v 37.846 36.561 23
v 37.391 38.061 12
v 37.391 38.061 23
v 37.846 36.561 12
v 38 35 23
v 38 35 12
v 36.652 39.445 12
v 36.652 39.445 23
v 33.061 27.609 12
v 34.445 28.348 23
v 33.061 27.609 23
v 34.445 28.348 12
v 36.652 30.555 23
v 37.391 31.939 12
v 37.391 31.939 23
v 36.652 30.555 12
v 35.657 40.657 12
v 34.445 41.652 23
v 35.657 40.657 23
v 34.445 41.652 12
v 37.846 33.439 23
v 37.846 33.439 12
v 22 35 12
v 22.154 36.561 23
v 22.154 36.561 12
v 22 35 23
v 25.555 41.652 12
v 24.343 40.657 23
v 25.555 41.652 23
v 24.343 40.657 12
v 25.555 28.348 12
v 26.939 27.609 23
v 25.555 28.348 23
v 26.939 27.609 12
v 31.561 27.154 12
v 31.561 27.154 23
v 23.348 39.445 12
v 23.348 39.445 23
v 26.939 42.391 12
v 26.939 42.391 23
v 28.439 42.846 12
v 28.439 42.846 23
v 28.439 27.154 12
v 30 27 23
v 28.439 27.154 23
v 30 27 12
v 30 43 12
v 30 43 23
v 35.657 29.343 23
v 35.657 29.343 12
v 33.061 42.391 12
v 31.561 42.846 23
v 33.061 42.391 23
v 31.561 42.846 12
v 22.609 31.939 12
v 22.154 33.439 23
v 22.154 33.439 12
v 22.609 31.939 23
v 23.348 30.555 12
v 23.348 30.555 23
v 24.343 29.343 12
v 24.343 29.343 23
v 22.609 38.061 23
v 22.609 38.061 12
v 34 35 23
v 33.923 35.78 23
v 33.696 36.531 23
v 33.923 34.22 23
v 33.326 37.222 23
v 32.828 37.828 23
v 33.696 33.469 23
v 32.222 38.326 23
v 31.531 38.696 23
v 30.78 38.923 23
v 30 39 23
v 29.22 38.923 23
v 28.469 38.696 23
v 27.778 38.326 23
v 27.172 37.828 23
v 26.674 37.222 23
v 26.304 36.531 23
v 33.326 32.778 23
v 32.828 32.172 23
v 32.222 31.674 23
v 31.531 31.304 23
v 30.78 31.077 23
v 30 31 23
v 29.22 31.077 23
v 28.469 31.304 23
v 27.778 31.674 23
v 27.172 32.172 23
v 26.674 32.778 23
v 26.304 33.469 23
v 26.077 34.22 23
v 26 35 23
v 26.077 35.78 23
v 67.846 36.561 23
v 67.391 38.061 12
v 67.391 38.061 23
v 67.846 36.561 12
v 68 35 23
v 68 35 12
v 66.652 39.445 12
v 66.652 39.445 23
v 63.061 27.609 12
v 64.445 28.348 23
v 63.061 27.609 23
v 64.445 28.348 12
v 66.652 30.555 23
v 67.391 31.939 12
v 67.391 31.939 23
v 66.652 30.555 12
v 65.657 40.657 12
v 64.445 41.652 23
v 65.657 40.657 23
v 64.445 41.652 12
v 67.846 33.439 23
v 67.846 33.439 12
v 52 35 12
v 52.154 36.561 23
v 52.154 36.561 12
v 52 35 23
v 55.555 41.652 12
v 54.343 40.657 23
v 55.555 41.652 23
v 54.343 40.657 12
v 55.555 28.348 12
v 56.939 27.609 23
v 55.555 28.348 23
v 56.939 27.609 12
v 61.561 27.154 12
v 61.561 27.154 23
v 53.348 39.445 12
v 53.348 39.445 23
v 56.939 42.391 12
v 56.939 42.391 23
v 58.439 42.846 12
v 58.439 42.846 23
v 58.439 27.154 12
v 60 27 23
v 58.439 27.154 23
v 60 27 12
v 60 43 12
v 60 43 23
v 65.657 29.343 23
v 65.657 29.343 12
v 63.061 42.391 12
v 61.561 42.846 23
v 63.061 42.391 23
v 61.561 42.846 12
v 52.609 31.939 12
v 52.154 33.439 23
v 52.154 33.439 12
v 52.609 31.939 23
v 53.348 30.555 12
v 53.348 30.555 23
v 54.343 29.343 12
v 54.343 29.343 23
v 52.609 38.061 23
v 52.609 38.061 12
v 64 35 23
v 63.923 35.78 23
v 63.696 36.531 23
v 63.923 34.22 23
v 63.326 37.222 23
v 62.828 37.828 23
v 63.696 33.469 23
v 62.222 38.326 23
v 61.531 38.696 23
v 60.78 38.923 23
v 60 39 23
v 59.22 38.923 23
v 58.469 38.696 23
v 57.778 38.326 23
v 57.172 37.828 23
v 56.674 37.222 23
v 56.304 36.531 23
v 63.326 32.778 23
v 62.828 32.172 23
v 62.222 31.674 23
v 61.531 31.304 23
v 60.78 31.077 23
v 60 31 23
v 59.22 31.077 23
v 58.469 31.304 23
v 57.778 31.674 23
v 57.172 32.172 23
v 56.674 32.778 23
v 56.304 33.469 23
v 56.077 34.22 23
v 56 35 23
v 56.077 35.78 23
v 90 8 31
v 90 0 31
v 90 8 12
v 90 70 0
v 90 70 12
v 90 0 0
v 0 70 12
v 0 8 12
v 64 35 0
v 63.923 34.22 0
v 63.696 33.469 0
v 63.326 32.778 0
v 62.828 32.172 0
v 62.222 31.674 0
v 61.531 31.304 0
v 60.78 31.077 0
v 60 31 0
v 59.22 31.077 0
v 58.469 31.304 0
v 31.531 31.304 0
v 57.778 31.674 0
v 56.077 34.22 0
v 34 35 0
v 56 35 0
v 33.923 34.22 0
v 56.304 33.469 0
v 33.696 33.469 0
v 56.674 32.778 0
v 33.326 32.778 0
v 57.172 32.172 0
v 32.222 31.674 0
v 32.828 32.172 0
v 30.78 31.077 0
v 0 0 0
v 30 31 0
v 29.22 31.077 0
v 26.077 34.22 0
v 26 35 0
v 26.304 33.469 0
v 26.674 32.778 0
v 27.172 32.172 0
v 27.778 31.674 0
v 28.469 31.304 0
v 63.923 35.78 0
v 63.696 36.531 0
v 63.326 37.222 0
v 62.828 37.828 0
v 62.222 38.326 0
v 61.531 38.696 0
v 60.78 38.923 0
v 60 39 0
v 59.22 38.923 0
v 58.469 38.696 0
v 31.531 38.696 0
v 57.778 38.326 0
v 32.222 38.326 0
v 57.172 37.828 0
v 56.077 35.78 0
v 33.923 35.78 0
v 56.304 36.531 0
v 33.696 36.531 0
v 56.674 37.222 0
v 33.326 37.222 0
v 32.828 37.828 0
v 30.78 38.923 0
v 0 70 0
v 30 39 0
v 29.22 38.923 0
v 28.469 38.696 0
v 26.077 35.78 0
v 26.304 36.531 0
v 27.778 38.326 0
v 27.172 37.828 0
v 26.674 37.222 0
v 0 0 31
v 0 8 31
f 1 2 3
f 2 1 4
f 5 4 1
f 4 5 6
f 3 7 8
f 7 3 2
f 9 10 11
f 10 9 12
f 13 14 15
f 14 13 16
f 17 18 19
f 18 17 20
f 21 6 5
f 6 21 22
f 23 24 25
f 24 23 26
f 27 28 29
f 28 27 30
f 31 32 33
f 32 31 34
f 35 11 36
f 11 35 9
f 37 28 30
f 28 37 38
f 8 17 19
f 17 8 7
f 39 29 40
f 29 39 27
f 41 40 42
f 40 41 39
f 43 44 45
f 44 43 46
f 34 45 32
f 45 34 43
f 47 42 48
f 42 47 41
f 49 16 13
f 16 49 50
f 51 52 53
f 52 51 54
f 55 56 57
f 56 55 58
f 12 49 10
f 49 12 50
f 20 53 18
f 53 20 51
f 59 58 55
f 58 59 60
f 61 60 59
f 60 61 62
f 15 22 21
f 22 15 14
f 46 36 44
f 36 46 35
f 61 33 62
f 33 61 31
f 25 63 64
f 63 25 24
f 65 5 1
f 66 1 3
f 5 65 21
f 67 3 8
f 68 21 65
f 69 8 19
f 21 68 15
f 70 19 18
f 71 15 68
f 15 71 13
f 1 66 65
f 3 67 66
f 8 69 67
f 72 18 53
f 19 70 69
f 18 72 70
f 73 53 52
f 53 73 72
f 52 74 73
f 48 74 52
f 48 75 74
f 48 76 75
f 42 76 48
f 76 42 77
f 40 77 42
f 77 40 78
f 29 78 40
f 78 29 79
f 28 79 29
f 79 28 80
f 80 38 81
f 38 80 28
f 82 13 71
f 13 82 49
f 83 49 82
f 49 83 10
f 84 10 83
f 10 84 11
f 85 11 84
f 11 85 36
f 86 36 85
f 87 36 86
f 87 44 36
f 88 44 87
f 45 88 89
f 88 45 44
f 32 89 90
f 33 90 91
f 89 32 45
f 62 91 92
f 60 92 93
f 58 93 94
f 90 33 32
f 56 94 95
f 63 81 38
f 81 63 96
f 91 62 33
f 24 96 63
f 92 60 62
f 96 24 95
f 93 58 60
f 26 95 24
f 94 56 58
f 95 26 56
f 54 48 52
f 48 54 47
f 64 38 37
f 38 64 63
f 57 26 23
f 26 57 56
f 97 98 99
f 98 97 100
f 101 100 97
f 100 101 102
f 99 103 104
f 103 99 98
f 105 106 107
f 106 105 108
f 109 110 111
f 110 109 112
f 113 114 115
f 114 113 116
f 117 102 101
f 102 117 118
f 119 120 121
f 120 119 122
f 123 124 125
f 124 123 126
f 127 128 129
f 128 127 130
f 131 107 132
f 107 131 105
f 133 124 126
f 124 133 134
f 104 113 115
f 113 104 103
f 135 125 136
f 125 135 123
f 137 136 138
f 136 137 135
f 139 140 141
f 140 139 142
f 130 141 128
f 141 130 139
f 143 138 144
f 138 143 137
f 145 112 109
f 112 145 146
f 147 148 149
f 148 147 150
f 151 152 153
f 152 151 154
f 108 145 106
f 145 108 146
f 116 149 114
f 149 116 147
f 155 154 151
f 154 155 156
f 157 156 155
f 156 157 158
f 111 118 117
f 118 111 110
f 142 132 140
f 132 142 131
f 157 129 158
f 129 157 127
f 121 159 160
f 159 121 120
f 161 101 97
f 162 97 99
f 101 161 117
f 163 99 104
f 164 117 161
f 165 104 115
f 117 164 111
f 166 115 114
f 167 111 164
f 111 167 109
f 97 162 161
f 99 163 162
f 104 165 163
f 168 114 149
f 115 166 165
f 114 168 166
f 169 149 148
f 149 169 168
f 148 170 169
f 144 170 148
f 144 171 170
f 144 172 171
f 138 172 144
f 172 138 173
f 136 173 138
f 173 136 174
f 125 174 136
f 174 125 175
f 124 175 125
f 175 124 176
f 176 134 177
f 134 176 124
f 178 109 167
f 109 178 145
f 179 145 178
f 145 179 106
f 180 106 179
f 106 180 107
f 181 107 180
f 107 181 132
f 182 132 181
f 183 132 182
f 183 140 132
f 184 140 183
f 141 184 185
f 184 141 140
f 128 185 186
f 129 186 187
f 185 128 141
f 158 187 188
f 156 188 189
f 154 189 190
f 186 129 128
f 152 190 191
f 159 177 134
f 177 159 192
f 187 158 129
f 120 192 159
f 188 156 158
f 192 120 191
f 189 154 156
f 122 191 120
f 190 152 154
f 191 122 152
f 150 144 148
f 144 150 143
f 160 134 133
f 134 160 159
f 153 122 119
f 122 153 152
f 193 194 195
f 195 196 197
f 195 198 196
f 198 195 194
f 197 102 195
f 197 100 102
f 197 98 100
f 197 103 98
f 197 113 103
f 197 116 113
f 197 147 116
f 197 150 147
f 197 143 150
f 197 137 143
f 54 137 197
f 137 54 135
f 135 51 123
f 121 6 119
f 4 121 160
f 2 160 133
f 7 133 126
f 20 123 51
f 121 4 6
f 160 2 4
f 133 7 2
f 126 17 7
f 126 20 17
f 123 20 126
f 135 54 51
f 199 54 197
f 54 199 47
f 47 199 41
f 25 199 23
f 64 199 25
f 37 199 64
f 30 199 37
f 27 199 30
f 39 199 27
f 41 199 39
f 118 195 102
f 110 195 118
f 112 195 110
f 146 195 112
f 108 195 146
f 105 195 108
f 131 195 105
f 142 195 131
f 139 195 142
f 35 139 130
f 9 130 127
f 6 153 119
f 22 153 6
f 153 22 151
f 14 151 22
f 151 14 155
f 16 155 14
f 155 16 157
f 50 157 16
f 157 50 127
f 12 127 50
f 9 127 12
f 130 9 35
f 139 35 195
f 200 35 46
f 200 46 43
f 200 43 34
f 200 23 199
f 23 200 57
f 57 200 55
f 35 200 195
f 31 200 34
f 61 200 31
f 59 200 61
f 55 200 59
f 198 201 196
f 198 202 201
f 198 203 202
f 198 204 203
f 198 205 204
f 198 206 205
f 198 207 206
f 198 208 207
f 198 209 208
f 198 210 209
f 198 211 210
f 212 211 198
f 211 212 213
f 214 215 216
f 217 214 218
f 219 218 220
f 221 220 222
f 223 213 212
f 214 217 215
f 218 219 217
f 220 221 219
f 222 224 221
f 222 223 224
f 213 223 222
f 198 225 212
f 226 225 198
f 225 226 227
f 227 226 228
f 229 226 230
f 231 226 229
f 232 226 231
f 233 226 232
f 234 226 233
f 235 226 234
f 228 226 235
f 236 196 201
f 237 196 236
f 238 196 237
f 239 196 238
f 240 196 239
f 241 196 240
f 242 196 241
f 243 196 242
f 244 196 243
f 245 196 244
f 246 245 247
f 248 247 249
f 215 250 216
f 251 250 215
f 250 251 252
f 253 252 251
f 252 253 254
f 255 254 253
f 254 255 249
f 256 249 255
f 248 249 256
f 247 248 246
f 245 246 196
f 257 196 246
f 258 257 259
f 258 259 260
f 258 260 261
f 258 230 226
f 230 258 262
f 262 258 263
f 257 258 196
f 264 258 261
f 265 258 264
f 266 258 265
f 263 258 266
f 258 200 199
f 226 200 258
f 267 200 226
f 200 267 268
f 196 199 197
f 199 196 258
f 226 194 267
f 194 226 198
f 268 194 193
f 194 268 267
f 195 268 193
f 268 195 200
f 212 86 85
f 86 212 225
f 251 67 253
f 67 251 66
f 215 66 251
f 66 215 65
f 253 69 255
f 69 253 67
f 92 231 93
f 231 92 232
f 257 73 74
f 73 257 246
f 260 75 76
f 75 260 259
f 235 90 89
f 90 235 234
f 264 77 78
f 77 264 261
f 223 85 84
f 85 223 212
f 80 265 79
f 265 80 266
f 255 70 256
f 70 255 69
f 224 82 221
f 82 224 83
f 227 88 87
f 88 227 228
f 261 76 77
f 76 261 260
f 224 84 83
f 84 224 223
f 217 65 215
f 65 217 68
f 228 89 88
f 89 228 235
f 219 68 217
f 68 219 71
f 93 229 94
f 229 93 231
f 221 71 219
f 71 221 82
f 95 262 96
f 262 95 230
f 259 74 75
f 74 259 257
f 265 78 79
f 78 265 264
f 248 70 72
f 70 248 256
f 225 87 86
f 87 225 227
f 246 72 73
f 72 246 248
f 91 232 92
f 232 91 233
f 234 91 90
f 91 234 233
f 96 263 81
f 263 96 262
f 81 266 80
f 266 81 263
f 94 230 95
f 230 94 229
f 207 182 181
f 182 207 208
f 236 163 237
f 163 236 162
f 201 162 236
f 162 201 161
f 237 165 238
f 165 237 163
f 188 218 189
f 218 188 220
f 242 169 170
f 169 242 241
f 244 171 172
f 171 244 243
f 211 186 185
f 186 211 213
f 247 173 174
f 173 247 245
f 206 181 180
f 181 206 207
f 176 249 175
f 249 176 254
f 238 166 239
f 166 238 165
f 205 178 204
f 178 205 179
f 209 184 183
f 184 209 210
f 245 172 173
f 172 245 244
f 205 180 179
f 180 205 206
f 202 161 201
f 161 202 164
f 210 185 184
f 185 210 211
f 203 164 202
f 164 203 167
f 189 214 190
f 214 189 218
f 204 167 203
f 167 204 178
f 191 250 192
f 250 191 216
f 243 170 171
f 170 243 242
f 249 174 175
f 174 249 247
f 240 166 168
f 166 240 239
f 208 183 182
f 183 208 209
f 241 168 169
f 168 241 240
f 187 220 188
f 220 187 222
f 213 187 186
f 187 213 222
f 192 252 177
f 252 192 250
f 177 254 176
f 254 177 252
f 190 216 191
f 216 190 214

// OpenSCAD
$fn = 32;

// ----------------------------------------------------------------------
// Drill jig: fence jig
// ----------------------------------------------------------------------

// --- parameters (mm) ---
plate_l = 90;             // plate length, X
plate_w = 70;             // plate width, Y
plate_t = 12;             // plate thickness
boss_d = 16;              // guide boss diameter
boss_h = 12;              // boss height above the plate
guide_d = 8;              // guide hole diameter
boss_pitch = 30;          // boss pitch
fence_h = 20;             // fence height above the plate
fence_t = 8;              // fence thickness

n_boss = 2;  // guide bosses
boss_x0 = (plate_l - (n_boss - 1) * boss_pitch) / 2;  // first boss X
boss_top = plate_t - 1 + boss_h;  // boss crown height
fence_top = plate_t - 1 + fence_h;  // fence crown height
total_h = max([fence_top, boss_top]);  // overall height

difference() {
  union() {
  cube([plate_l, plate_w, plate_t]);
  for (i = [0 : n_boss - 1])
    translate([boss_x0 + i * boss_pitch, plate_w / 2, plate_t - 1])
      cylinder(h = boss_h, d = boss_d);
  translate([0, 0, plate_t - 1]) cube([plate_l, fence_t, fence_h]);
  }
  for (i = [0 : n_boss - 1])
    translate([boss_x0 + i * boss_pitch, plate_w / 2, -1])
      cylinder(h = plate_t + boss_h, d = guide_d);
}
